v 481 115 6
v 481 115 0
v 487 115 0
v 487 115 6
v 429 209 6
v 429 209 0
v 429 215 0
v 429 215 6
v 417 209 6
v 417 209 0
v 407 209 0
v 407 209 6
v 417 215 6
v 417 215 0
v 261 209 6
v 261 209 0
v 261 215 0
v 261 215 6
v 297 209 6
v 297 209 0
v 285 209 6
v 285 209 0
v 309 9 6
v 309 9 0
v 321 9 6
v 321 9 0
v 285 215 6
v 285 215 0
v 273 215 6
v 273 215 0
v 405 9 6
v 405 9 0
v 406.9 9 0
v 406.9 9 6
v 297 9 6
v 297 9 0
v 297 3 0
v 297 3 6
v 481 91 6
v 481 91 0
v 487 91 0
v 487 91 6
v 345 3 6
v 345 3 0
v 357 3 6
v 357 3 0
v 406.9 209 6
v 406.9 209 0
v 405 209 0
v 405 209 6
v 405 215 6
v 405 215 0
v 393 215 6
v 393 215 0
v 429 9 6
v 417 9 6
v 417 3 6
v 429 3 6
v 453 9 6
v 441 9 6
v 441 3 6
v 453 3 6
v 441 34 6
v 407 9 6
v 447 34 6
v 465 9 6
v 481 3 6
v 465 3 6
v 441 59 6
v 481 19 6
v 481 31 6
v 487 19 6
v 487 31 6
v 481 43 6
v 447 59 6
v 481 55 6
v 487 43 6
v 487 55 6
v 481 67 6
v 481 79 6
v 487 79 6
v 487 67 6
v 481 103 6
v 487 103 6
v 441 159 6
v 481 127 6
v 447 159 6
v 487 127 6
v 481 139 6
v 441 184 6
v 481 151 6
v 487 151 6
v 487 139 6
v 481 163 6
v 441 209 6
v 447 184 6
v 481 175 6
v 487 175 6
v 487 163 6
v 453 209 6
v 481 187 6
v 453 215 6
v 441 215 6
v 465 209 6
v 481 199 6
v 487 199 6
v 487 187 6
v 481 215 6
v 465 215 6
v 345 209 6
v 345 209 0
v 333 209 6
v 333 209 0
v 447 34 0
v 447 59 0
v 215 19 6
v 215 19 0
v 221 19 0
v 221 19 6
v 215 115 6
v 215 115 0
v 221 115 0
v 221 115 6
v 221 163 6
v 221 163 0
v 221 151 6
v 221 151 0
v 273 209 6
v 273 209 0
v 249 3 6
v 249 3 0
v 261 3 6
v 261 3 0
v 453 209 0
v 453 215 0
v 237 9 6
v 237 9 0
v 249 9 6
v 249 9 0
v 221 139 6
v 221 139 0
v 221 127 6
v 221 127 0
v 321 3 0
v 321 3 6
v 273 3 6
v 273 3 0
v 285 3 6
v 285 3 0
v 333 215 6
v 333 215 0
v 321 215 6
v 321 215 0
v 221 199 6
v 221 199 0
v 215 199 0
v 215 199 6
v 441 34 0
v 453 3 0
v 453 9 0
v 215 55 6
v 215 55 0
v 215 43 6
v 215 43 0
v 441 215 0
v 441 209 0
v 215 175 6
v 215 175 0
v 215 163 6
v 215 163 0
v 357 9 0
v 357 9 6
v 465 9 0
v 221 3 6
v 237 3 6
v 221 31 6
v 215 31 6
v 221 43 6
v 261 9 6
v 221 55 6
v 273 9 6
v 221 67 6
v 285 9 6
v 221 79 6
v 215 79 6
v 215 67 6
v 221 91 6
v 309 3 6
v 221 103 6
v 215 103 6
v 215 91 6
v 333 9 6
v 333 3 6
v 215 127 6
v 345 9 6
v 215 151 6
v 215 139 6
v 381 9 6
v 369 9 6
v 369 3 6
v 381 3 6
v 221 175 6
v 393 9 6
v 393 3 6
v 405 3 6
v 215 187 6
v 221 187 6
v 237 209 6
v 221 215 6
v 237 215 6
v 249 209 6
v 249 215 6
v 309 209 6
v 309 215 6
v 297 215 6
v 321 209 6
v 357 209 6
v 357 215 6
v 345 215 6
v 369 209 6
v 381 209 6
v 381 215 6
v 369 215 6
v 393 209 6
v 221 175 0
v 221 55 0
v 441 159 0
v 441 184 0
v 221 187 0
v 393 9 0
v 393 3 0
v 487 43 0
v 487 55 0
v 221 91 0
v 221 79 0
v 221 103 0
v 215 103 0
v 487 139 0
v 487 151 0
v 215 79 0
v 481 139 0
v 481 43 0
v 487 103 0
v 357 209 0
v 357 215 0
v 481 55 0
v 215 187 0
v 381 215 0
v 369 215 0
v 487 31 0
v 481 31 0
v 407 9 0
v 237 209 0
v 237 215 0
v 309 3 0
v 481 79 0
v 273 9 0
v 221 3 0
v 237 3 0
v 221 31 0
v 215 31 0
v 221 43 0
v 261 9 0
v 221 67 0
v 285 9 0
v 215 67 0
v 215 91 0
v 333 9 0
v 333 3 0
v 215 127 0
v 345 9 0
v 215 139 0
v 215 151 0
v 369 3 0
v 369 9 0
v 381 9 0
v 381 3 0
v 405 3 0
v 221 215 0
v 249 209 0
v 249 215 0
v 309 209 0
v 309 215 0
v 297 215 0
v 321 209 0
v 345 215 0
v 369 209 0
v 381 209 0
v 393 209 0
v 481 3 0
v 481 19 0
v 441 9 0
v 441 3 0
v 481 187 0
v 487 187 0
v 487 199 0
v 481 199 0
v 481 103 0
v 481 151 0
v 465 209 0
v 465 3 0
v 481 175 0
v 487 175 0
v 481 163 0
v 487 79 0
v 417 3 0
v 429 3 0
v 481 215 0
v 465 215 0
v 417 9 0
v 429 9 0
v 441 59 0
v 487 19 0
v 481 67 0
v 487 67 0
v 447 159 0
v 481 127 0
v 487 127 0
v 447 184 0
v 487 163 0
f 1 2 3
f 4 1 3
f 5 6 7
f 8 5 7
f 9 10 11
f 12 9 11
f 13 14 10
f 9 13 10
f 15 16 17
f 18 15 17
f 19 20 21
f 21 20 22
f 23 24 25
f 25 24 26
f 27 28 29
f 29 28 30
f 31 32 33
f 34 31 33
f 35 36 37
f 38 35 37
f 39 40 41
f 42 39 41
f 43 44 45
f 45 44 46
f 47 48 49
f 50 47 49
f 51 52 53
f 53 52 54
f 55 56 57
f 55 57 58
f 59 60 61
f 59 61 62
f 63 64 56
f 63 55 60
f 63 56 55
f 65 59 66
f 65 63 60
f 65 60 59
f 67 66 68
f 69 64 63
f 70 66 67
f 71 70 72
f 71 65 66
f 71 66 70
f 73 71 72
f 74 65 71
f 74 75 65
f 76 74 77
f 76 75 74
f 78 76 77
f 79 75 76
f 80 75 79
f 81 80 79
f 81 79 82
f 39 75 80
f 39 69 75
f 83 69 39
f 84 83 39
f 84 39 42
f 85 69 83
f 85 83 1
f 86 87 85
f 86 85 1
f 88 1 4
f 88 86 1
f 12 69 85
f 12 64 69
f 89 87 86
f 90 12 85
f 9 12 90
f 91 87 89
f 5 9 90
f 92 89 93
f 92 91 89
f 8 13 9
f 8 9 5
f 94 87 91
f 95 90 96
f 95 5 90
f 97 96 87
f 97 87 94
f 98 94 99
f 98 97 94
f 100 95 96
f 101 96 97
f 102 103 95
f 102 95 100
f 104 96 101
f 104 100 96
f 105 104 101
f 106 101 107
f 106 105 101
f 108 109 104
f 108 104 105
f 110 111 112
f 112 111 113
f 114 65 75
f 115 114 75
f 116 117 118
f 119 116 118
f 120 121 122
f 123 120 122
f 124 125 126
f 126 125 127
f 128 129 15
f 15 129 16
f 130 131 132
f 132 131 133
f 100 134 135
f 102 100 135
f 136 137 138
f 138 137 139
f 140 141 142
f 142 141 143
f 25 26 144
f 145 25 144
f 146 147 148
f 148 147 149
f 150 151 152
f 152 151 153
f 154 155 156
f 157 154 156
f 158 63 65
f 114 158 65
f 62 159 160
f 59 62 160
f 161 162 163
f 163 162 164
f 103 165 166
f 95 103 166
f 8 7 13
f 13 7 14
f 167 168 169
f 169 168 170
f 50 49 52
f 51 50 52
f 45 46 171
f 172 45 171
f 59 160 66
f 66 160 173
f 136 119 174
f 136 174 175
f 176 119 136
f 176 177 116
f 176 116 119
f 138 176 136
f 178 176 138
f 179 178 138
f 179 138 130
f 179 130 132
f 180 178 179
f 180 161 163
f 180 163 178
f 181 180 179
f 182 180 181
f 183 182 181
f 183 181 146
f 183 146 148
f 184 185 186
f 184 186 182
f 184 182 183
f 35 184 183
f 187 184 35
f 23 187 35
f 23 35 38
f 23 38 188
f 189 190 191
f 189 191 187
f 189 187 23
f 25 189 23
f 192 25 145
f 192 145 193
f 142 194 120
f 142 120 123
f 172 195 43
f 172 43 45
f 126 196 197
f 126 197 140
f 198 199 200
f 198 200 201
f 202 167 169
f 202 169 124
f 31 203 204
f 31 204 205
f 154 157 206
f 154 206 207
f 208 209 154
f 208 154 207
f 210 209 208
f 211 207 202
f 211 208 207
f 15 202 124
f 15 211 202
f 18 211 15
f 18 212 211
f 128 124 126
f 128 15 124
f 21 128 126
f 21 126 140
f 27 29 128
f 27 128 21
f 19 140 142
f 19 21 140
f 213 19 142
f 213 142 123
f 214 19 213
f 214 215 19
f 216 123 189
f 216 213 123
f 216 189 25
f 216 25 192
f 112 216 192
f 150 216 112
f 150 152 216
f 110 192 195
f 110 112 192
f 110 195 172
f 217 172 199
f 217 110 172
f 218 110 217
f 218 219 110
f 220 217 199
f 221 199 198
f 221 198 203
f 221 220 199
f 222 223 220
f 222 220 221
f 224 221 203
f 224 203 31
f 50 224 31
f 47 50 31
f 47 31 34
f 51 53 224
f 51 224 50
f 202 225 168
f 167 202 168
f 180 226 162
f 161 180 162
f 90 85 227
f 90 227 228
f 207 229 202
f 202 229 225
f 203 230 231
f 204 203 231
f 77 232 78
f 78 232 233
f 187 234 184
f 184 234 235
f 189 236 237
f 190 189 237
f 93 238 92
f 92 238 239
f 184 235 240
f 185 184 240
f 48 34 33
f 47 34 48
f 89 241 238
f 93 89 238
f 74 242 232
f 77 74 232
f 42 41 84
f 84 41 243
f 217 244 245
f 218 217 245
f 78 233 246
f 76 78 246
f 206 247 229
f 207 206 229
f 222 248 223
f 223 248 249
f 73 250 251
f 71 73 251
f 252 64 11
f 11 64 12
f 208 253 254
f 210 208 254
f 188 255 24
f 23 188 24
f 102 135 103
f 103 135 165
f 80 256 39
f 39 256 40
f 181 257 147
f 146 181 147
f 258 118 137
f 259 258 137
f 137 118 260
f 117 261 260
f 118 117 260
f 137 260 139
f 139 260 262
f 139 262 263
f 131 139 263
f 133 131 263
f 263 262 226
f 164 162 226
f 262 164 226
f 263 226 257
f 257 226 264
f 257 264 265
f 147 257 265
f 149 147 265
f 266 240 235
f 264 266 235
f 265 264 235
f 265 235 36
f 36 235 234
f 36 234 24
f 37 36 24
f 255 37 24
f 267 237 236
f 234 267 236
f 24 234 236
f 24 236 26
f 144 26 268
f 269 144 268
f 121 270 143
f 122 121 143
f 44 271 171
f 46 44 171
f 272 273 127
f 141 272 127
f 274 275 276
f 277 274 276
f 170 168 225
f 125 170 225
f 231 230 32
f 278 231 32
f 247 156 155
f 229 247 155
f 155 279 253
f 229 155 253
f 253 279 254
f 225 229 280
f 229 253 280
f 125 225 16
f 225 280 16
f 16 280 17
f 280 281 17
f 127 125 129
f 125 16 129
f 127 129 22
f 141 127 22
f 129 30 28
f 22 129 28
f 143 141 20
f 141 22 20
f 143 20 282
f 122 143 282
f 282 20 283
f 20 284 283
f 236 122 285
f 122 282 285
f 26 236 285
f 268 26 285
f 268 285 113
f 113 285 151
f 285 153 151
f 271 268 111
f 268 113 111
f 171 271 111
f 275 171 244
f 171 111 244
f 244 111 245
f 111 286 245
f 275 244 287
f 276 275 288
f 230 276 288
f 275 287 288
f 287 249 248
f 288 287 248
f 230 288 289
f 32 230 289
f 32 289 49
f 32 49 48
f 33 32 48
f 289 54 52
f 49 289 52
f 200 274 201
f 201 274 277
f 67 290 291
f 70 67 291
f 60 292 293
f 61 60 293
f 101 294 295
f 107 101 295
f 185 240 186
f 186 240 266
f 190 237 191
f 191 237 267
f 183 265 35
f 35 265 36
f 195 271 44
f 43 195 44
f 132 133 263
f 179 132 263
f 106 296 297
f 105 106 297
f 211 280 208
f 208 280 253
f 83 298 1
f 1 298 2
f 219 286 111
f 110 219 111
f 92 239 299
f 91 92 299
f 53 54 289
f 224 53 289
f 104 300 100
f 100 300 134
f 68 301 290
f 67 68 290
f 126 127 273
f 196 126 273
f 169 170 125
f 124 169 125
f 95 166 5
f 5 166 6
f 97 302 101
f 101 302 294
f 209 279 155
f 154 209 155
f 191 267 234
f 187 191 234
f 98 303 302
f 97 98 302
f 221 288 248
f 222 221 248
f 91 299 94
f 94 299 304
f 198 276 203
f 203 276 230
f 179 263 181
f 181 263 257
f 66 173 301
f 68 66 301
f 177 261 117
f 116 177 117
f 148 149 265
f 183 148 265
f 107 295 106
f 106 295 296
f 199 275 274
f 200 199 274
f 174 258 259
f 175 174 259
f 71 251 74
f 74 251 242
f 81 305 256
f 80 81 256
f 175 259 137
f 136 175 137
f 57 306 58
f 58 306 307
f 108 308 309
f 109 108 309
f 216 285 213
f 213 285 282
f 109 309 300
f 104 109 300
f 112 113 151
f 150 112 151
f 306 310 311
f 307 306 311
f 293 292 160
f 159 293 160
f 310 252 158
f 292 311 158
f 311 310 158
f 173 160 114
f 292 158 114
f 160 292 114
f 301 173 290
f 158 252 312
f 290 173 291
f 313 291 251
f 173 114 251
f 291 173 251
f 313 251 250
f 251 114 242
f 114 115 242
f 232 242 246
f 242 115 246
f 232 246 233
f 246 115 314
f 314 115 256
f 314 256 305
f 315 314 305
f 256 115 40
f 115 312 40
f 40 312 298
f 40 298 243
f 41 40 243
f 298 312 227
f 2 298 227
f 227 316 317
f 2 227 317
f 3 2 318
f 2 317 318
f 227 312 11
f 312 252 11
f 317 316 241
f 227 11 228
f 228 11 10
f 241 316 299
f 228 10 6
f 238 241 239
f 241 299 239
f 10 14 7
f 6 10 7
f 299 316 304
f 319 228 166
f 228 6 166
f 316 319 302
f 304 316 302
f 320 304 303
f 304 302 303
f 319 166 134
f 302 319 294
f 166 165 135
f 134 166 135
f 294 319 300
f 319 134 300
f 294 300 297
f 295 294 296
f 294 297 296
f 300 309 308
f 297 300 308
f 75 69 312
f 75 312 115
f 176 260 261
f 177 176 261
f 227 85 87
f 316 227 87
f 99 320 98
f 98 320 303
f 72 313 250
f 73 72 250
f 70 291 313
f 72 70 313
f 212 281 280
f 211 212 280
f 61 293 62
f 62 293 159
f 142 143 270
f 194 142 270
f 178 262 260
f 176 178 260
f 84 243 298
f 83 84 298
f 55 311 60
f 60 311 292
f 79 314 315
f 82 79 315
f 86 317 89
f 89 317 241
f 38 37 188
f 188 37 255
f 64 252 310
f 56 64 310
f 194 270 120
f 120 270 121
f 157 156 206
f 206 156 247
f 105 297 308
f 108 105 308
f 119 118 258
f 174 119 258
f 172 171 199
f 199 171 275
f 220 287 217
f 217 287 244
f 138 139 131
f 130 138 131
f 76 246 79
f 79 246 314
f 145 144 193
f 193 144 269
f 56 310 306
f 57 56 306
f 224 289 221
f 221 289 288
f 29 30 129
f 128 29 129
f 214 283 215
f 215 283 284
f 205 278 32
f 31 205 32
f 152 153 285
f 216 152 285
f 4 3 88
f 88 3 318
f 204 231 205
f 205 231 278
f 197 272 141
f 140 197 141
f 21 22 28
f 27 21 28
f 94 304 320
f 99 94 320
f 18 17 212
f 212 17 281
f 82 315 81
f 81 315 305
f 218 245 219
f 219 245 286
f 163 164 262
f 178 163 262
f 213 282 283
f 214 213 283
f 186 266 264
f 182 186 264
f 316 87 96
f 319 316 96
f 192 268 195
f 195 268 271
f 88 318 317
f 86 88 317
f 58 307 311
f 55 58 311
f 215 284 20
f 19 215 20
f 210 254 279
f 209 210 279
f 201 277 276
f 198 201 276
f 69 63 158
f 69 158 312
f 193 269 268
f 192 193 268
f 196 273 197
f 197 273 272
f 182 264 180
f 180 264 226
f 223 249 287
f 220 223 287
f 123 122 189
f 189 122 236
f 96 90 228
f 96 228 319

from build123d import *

# Parameters (mm, degrees)
BOSS_EXTRUDE1_DEPTH = 6
SKETCH2_W           = 0.1
SKETCH2_H           = 265.514483505
SKETCH2_W_2         = 6
SKETCH2_H_2         = 25
CUT_EXTRUDE1_DEPTH  = 6


with BuildPart() as part:
    # Model → Boss-Extrude1 (new body)
    with BuildSketch(Plane.XY):
        Polygon((221, 215), (221, 199), (215, 199), (215, 187), (221, 187), (221, 175), (215, 175), (215, 163), (221, 163), (221, 151), (215, 151), (215, 139), (221, 139), (221, 127), (215, 127), (215, 115), (221, 115), (221, 103), (215, 103), (215, 91), (221, 91), (221, 79), (215, 79), (215, 67), (221, 67), (221, 55), (215, 55), (215, 43), (221, 43), (221, 31), (215, 31), (215, 19), (221, 19), (221, 3), (237, 3), (237, 9), (249, 9), (249, 3), (261, 3), (261, 9), (273, 9), (273, 3), (285, 3), (285, 9), (297, 9), (297, 3), (309, 3), (309, 9), (321, 9), (321, 3), (333, 3), (333, 9), (345, 9), (345, 3), (357, 3), (357, 9), (369, 9), (369, 3), (381, 3), (381, 9), (393, 9), (393, 3), (405, 3), (405, 9), (417, 9), (417, 3), (429, 3), (429, 9), (441, 9), (441, 3), (453, 3), (453, 9), (465, 9), (465, 3), (477, 3), (481, 3), (481, 19), (487, 19), (487, 31), (481, 31), (481, 43), (487, 43), (487, 55), (481, 55), (481, 67), (487, 67), (487, 79), (481, 79), (481, 91), (487, 91), (487, 103), (481, 103), (481, 115), (487, 115), (487, 127), (481, 127), (481, 139), (487, 139), (487, 151), (481, 151), (481, 163), (487, 163), (487, 175), (481, 175), (481, 187), (487, 187), (487, 199), (481, 199), (481, 215), (465, 215), (465, 209), (453, 209), (453, 215), (441, 215), (441, 209), (429, 209), (429, 215), (417, 215), (417, 209), (405, 209), (405, 215), (393, 215), (393, 209), (381, 209), (381, 215), (369, 215), (369, 209), (357, 209), (357, 215), (345, 215), (345, 209), (333, 209), (333, 215), (321, 215), (321, 209), (309, 209), (309, 215), (297, 215), (297, 209), (285, 209), (285, 215), (273, 215), (273, 209), (261, 209), (261, 215), (249, 215), (249, 209), (237, 209), (237, 215), (225, 215), align=None)
    extrude(amount=BOSS_EXTRUDE1_DEPTH)

    # Sketch2 → Cut-Extrude1 (cut)
    with BuildSketch(Plane.XY.offset(6)):
        with Locations((406.95, 104.310206134)):
            Rectangle(SKETCH2_W, SKETCH2_H)
        with Locations((444, 171.5)):
            Rectangle(SKETCH2_W_2, SKETCH2_H_2)
        with Locations((444, 46.5)):
            Rectangle(SKETCH2_W_2, SKETCH2_H_2)
    extrude(amount=-CUT_EXTRUDE1_DEPTH, mode=Mode.SUBTRACT)


with BuildPart() as cut_extrude1_piece_1:
    # of the separate pieces the step leaves, piece 1, a body of its own (cut_extrude1_pieces)
    add(part.part.solids().sort_by_distance((221, 215, 0))[0])


with BuildPart() as cut_extrude1_piece_2:
    # of the separate pieces the step leaves, piece 2, a body of its own (cut_extrude1_pieces)
    add(part.part.solids().sort_by_distance((417, 209, 0))[0])


solid = Compound([cut_extrude1_piece_1.part, cut_extrude1_piece_2.part])
